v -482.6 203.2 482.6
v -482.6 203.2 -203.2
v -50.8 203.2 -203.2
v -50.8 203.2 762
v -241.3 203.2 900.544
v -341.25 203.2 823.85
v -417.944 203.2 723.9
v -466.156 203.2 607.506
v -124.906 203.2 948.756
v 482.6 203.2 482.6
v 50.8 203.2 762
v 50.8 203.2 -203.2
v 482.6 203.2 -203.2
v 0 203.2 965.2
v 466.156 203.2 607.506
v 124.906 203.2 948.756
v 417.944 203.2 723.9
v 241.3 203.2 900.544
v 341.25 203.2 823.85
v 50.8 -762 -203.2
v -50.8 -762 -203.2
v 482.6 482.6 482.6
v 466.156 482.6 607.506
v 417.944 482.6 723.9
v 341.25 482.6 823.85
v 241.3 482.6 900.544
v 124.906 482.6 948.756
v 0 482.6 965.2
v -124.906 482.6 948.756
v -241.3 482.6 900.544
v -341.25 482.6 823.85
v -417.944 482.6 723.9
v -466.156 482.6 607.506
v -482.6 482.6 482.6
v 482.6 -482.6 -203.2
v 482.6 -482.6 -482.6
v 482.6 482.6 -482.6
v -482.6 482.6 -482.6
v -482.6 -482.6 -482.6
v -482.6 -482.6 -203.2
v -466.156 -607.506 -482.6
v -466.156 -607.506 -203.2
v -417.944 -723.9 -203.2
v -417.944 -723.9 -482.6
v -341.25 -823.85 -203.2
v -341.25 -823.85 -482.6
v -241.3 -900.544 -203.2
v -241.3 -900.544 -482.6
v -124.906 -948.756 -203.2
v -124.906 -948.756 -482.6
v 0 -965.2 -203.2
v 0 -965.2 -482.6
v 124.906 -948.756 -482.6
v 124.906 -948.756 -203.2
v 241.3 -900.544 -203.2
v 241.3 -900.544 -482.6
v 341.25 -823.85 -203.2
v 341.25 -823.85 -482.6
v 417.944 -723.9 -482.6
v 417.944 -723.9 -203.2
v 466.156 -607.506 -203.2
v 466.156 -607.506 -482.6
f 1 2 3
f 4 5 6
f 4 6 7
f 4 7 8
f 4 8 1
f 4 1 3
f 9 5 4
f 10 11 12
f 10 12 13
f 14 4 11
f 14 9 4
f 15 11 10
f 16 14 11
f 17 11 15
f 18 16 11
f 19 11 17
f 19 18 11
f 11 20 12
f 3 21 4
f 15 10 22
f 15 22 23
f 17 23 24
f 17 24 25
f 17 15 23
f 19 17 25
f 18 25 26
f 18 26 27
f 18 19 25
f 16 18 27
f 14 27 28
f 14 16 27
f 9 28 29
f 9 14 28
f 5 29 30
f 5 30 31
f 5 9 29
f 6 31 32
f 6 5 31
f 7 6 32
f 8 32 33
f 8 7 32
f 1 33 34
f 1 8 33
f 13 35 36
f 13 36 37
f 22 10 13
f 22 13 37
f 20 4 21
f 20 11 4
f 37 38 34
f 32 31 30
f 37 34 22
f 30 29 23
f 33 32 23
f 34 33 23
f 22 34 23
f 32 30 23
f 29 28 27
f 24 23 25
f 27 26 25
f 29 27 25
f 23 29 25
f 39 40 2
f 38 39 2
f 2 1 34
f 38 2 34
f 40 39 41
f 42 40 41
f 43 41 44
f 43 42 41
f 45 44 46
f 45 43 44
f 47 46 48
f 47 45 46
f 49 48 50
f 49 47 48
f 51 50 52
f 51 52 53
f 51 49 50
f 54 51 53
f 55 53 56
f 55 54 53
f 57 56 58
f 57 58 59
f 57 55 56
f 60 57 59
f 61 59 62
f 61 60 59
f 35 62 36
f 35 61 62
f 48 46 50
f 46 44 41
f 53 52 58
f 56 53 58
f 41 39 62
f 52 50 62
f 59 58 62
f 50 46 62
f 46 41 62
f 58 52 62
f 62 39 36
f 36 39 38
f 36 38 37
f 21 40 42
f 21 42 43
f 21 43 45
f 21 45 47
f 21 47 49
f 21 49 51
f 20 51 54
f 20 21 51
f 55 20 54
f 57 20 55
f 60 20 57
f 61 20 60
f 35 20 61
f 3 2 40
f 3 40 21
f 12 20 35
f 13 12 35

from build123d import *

# Parameters (mm, degrees)
F0_W     = 965.2
F0_H     = 965.2
F1_DEPTH = 482.6
F2_W     = 685.8
F2_H     = 685.8
F3_DEPTH = 965.201
F5_DEPTH = 279.4
F7_DEPTH = 279.4
F9_DEPTH = 50.8


with BuildPart() as f1:
    # F0 (on Top) → F1 (new body, symmetric)
    with BuildSketch(Plane.XY):
        Rectangle(F0_W, F0_H)
    extrude(amount=F1_DEPTH, both=True)

    # F2 (on face) → F3 (cut, through all)
    with BuildSketch(Plane(origin=(-482.6, 0, 0), x_dir=(0, -1, 0), z_dir=(-1, 0, 0))):
        with Locations((139.7, 139.7)):
            Rectangle(F2_W, F2_H)
    extrude(amount=-F3_DEPTH, mode=Mode.SUBTRACT)

    # F4 (on face) → F5 (join, through all)
    with BuildSketch(Plane.XZ.offset(-203.2)):
        with BuildLine():
            Line((-482.6, 482.6), (482.6, 482.6))
            ThreePointArc((482.6, 482.6), (0, 965.2), (-482.6, 482.6))
        make_face()
    extrude(amount=-F5_DEPTH)

    # F6 (on face) → F7 (join, through all)
    with BuildSketch(Plane.XY.offset(-203.2)):
        with BuildLine():
            Line((482.6, -482.6), (-482.6, -482.6))
            ThreePointArc((-482.6, -482.6), (0, -965.2), (482.6, -482.6))
        make_face()
    extrude(amount=-F7_DEPTH)

    # F8 (on Right) → F9 (join, symmetric)
    with BuildSketch(Plane.YZ):
        Polygon((-762, -203.2), (203.2, -203.2), (203.2, 762), align=None)
    extrude(amount=F9_DEPTH, both=True)


solid = f1.part
